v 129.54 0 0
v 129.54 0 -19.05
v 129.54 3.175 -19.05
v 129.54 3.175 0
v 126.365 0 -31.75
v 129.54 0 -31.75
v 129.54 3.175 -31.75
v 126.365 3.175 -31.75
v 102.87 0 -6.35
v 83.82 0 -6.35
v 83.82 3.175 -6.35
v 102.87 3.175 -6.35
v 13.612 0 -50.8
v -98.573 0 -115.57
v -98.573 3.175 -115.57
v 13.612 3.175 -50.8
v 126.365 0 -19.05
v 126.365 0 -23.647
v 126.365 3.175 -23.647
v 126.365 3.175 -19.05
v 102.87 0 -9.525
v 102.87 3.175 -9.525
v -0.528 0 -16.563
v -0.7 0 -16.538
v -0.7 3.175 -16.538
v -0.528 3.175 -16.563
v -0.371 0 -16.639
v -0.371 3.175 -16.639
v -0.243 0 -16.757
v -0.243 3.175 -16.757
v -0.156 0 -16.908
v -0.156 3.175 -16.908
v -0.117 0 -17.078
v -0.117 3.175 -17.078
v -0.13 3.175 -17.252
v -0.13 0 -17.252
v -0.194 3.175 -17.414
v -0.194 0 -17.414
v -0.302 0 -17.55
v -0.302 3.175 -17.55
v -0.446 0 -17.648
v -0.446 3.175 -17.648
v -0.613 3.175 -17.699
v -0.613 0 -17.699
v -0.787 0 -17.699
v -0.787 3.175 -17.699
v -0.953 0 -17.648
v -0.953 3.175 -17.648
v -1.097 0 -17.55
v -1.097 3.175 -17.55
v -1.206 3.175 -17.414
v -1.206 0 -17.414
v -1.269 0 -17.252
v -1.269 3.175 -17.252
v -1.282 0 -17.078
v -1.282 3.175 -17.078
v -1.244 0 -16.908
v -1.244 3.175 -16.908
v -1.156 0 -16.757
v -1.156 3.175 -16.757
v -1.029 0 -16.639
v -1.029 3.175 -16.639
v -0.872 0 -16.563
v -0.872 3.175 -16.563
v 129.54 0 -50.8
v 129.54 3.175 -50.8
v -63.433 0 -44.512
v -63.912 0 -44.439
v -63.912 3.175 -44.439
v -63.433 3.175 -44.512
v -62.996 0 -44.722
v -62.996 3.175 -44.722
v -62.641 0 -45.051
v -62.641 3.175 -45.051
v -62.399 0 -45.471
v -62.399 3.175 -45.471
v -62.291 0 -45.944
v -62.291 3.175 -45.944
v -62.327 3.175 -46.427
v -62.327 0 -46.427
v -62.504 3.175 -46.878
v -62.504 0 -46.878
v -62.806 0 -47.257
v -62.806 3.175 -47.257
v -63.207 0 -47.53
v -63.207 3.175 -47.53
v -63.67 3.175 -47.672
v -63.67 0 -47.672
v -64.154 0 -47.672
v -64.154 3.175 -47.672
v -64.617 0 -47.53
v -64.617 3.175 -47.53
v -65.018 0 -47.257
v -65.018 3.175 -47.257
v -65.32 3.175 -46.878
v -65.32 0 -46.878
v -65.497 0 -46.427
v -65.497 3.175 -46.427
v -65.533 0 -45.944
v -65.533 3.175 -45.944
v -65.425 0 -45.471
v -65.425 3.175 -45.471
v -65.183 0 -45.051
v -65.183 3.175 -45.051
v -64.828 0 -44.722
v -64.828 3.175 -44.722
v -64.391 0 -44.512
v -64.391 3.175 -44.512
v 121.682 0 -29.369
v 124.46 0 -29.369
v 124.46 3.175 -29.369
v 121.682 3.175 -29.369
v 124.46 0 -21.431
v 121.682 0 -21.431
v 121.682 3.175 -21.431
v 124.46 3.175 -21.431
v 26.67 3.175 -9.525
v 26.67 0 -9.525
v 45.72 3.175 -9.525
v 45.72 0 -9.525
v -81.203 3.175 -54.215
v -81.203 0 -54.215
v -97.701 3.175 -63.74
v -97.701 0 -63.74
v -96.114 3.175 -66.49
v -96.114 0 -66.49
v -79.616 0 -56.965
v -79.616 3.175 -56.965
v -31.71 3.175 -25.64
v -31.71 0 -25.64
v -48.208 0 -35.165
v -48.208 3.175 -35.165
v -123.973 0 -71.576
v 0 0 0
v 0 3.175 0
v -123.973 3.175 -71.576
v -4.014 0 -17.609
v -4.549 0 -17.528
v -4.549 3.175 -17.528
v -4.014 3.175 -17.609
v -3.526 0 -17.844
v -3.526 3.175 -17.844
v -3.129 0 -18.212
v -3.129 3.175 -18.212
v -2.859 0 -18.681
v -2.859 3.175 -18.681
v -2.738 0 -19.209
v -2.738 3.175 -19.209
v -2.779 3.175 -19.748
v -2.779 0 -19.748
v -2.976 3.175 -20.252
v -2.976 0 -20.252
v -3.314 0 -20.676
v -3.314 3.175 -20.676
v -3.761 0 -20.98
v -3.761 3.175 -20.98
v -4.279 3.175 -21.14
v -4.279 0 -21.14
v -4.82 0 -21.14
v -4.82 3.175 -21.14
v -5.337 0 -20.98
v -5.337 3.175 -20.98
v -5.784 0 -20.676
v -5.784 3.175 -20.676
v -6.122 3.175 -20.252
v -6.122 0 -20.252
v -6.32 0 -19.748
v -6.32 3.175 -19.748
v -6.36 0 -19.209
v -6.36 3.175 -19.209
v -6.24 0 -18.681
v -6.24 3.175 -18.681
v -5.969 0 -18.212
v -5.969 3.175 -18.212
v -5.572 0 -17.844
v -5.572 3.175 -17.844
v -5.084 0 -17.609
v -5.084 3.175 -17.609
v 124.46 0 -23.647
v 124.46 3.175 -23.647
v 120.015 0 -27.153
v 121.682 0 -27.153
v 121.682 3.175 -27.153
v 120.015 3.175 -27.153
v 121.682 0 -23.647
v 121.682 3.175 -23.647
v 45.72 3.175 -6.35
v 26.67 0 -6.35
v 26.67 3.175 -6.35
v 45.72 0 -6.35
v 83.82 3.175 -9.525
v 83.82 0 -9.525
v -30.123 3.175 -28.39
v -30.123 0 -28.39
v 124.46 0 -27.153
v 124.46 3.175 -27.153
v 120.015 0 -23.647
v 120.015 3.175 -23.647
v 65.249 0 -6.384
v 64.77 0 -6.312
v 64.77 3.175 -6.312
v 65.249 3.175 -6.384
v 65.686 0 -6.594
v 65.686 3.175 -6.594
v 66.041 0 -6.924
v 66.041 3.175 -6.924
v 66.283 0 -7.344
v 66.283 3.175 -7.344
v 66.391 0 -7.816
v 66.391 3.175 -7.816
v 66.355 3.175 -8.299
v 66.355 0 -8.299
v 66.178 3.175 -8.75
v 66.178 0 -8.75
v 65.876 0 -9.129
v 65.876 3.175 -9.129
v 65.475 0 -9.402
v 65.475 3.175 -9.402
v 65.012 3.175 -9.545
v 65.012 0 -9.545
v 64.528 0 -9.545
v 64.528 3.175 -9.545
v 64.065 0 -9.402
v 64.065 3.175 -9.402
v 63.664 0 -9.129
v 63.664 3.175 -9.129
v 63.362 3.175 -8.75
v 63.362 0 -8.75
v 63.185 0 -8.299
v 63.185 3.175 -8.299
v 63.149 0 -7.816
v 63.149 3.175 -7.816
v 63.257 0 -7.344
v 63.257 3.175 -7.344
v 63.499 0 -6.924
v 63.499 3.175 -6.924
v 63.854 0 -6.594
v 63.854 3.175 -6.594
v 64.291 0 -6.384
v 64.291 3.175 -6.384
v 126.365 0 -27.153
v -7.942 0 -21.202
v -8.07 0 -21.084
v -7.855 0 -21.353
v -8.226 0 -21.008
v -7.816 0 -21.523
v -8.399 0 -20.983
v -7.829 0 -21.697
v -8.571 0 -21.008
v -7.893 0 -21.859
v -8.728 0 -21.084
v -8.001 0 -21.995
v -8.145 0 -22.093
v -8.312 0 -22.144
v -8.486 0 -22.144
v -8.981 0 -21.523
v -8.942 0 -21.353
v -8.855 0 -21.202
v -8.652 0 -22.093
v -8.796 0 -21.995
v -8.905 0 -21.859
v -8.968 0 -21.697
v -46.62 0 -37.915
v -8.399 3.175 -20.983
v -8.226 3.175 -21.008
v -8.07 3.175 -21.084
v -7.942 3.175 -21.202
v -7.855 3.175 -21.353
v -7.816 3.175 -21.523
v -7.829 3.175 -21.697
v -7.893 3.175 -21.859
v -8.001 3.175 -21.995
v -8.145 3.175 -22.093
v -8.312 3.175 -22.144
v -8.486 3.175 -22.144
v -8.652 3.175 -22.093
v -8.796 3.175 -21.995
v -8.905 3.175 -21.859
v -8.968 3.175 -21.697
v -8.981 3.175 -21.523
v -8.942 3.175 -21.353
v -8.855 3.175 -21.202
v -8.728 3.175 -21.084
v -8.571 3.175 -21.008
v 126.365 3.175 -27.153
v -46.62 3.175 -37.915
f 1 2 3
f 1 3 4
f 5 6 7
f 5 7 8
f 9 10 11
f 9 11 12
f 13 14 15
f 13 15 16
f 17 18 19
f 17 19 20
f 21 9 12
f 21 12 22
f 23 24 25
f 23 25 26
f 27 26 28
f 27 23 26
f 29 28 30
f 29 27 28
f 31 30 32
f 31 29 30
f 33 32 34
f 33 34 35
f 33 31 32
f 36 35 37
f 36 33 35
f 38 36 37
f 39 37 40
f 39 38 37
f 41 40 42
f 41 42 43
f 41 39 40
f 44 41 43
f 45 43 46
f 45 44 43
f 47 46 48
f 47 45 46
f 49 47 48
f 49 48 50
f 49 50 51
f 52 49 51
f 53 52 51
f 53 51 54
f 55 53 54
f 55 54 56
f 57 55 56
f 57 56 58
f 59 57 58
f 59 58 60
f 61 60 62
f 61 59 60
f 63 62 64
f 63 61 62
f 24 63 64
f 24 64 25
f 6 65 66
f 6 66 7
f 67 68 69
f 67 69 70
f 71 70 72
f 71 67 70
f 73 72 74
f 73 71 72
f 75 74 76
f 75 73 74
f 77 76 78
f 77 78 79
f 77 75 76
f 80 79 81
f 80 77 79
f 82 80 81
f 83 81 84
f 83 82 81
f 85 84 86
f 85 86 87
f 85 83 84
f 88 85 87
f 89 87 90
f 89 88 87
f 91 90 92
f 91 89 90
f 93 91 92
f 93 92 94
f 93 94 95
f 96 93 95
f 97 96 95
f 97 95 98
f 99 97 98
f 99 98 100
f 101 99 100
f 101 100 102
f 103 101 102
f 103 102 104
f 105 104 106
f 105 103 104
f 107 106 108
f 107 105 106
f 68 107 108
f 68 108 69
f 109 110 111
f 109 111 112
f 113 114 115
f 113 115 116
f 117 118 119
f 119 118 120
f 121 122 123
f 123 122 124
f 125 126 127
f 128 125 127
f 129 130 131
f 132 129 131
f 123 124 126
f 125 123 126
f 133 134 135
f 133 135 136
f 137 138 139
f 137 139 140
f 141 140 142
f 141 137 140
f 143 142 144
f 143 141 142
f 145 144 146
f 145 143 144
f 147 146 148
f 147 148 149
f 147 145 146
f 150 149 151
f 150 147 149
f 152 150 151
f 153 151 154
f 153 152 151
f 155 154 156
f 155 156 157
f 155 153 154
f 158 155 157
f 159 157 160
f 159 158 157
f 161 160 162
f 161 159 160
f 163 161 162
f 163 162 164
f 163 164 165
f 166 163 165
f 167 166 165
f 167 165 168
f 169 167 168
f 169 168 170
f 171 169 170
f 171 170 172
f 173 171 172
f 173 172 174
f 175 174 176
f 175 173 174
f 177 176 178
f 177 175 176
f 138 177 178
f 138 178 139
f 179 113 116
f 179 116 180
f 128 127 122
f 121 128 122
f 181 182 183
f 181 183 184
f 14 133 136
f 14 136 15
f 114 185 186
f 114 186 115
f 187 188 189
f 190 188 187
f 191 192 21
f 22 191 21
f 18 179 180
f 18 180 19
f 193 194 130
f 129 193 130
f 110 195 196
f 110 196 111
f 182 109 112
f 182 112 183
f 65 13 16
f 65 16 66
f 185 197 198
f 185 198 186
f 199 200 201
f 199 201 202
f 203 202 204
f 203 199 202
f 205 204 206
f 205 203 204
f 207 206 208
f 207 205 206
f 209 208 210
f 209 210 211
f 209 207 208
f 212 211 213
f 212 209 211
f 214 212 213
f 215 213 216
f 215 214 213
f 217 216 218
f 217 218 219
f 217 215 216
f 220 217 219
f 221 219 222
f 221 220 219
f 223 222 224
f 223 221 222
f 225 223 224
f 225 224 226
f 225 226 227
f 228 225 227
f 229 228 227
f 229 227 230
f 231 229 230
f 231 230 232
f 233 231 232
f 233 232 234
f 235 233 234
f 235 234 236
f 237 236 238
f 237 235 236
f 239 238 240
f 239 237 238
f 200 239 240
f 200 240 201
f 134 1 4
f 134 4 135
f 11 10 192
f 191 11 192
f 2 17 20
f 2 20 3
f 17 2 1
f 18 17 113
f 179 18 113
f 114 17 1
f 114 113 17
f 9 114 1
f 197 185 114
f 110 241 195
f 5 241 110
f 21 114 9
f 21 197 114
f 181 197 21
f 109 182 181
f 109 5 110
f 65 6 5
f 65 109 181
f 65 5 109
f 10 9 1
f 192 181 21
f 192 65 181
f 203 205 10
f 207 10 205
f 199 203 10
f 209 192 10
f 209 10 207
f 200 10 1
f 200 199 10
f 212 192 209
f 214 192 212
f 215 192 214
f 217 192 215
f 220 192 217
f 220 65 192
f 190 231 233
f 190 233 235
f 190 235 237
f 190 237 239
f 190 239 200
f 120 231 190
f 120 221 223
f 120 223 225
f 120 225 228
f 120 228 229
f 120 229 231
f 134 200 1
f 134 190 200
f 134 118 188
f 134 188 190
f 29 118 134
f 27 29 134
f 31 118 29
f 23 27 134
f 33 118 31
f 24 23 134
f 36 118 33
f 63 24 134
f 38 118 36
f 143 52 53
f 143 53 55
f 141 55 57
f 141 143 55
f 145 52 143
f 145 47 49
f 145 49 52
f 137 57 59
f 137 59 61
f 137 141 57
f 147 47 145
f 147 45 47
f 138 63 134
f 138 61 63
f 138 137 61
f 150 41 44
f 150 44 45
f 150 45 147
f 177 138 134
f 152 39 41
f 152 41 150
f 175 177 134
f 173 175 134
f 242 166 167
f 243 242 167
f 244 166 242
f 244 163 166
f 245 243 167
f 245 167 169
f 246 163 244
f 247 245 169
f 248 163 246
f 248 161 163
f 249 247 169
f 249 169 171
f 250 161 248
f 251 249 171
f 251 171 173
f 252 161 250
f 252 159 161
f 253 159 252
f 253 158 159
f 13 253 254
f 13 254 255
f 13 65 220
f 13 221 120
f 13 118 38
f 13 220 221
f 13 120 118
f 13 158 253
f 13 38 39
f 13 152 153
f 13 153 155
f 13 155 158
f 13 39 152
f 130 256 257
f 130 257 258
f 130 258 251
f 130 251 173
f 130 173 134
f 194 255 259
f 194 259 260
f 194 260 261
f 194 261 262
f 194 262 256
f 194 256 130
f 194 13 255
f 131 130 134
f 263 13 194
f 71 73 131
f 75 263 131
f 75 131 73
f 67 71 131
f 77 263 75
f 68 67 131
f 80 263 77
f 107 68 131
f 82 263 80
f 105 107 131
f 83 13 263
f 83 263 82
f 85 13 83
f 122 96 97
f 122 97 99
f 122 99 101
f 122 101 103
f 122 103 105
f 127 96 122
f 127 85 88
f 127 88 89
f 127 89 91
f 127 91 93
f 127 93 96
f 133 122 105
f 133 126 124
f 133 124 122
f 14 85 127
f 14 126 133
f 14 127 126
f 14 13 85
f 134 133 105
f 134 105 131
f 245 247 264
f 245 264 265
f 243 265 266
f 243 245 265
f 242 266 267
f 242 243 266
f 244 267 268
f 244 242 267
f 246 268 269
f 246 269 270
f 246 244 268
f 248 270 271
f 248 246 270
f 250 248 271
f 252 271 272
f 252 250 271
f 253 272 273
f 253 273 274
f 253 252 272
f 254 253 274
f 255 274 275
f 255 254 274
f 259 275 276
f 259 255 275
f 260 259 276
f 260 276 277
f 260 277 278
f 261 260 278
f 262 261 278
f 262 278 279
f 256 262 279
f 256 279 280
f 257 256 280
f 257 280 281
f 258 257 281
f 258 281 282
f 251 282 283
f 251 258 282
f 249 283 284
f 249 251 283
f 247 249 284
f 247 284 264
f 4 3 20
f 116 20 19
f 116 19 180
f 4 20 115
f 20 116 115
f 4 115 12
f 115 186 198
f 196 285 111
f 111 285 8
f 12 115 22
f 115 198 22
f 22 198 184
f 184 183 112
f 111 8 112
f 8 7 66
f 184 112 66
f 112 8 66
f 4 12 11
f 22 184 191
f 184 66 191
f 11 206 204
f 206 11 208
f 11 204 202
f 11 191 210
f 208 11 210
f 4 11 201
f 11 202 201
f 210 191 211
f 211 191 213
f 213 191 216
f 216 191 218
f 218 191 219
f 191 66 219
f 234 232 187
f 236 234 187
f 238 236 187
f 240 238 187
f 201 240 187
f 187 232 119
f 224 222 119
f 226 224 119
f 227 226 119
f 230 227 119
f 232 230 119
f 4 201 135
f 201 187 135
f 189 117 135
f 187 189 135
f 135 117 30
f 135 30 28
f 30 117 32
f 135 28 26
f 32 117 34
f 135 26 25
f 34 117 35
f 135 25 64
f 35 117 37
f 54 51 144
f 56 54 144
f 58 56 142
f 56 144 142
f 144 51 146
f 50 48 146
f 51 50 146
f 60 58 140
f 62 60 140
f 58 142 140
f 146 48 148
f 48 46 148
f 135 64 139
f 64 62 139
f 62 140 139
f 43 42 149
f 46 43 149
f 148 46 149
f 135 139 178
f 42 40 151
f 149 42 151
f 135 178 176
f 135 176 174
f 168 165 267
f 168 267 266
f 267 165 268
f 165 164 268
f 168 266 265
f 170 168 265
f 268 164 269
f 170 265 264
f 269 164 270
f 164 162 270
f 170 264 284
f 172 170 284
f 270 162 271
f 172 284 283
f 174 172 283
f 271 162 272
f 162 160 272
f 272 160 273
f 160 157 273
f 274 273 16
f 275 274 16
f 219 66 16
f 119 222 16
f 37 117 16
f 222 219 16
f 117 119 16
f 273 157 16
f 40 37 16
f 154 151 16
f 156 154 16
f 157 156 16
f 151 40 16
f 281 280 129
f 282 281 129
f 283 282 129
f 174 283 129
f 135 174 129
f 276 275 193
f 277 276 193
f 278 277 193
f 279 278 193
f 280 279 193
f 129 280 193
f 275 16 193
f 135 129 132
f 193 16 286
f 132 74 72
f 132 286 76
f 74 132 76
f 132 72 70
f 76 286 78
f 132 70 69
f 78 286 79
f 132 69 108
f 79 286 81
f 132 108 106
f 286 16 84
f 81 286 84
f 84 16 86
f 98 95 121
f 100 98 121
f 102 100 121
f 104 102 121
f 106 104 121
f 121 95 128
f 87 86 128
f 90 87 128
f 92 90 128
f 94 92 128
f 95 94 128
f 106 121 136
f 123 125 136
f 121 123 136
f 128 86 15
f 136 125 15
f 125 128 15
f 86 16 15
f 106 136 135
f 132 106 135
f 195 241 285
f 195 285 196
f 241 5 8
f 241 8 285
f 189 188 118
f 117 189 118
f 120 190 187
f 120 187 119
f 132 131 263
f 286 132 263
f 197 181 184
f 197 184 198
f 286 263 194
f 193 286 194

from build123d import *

# Parameters (mm, degrees)
SKETCH1_R           = 0.5842
SKETCH1_R_2         = 1.8161
SKETCH1_R_3         = 1.6256
SKETCH1_W           = 19.05
SKETCH1_H           = 3.175
BOSS_EXTRUDE2_DEPTH = 3.175


with BuildPart() as part:
    # Sketch1 → Boss-Extrude2 (new body)
    with BuildSketch(Plane(origin=(0, 0, 0), x_dir=(1, 0, 0), z_dir=(0, 1, 0))):
        Polygon((13.611818976, 50.8), (129.54, 50.8), (129.54, 31.75), (126.365, 31.75), (126.365, 27.1526), (124.46, 27.1526), (124.46, 29.36875), (121.681875, 29.36875), (121.681875, 27.1526), (120.015, 27.1526), (120.015, 23.6474), (121.681875, 23.6474), (121.681875, 21.43125), (124.46, 21.43125), (124.46, 23.6474), (126.365, 23.6474), (126.365, 19.05), (129.54, 19.05), (129.54, 0), (0, 0), (-123.973111831, 71.575909488), (-98.573111831, 115.57), align=None)
        with Locations(Location((-8.398663944, 21.566725284, 0), (0, 0, 270))):
            Circle(SKETCH1_R, mode=Mode.SUBTRACT)
        with Locations(Location((-4.549181024, 19.344225284, 0), (0, 0, 270))):
            Circle(SKETCH1_R_2, mode=Mode.SUBTRACT)
        with Locations(Location((-0.699698105, 17.121725284, 0), (0, 0, 270))):
            Circle(SKETCH1_R, mode=Mode.SUBTRACT)
        with Locations(Location((-63.911896428, 46.06498613, 0), (0, 0, 270))):
            Circle(SKETCH1_R_3, mode=Mode.SUBTRACT)
        with Locations(Location((64.77, 7.9375, 0), (0, 0, 270))):
            Circle(SKETCH1_R_3, mode=Mode.SUBTRACT)
        Polygon((-96.113714312, 66.489801459), (-79.61593037, 56.964801459), (-81.20343037, 54.215170802), (-97.701214312, 63.740170802), align=None, mode=Mode.SUBTRACT)
        Polygon((-46.620362486, 37.914801459), (-30.122578543, 28.389801459), (-31.710078543, 25.640170802), (-48.207862486, 35.165170802), align=None, mode=Mode.SUBTRACT)
        with Locations((36.195, 7.9375)):
            Rectangle(SKETCH1_W, SKETCH1_H, mode=Mode.SUBTRACT)
        with Locations((93.345, 7.9375)):
            Rectangle(SKETCH1_W, SKETCH1_H, mode=Mode.SUBTRACT)
    extrude(amount=BOSS_EXTRUDE2_DEPTH)


solid = part.part
